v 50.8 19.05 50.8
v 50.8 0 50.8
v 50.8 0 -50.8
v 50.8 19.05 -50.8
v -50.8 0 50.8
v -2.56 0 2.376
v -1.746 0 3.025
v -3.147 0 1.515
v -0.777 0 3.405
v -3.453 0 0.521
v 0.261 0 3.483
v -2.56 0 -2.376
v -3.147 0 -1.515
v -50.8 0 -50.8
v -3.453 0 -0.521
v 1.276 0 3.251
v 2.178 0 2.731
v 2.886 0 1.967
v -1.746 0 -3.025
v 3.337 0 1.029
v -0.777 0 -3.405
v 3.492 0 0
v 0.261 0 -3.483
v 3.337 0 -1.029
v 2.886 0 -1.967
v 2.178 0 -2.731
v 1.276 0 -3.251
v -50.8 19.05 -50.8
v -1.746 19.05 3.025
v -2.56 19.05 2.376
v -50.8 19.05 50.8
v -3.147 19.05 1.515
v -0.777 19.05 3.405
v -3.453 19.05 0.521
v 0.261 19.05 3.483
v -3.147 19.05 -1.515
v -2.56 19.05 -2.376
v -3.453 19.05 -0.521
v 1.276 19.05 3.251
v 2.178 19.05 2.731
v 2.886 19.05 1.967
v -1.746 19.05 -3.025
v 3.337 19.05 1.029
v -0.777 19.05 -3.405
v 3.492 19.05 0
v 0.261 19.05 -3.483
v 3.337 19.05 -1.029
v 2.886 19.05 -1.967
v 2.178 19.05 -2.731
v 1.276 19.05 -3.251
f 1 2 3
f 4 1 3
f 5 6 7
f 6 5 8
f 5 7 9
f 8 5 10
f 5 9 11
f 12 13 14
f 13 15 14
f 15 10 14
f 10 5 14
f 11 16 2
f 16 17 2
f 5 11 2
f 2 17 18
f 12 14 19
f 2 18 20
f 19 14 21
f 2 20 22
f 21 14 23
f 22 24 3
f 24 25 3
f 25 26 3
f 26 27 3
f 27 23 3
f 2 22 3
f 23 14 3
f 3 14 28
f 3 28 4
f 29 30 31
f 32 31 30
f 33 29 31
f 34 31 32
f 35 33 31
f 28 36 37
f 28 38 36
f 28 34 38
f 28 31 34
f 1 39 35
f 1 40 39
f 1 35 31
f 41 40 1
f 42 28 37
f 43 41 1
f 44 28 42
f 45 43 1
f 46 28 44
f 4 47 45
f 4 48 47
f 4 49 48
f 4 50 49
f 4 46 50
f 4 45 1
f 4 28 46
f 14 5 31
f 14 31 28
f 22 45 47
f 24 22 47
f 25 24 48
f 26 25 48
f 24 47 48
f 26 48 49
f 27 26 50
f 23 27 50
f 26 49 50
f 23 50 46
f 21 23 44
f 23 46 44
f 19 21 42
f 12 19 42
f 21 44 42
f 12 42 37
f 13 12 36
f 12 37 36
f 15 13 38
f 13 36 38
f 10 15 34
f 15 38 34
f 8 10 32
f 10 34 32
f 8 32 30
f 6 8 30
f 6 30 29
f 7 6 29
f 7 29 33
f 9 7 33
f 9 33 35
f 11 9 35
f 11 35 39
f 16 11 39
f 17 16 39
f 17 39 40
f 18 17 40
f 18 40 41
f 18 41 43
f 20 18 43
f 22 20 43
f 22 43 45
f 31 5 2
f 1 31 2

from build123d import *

# Parameters (mm, degrees)
SKETCH1_W               = 101.6
SKETCH1_H               = 101.6
BOSS_EXTRUDE1_DEPTH     = 19.05
SKETCH2_R               = 3.4925
CUT_EXTRUDE1_DEPTH      = 1
CUT_EXTRUDE1_DEPTH_BACK = 20.05


with BuildPart() as part:
    # Sketch1 → Boss-Extrude1 (new body)
    with BuildSketch(Plane(origin=(0, 0, 0), x_dir=(1, 0, 0), z_dir=(0, 1, 0))):
        Rectangle(SKETCH1_W, SKETCH1_H)
    extrude(amount=BOSS_EXTRUDE1_DEPTH)

    # Sketch2 → Cut-Extrude1 (cut, two sides)
    with BuildSketch(Plane(origin=(0, 19.05, 0), x_dir=(1, 0, 0), z_dir=(0, 1, 0))) as cut_extrude1_sk:
        Circle(SKETCH2_R)
    extrude(amount=CUT_EXTRUDE1_DEPTH, mode=Mode.SUBTRACT)
    extrude(cut_extrude1_sk.sketch, amount=-CUT_EXTRUDE1_DEPTH_BACK, mode=Mode.SUBTRACT)


solid = part.part
